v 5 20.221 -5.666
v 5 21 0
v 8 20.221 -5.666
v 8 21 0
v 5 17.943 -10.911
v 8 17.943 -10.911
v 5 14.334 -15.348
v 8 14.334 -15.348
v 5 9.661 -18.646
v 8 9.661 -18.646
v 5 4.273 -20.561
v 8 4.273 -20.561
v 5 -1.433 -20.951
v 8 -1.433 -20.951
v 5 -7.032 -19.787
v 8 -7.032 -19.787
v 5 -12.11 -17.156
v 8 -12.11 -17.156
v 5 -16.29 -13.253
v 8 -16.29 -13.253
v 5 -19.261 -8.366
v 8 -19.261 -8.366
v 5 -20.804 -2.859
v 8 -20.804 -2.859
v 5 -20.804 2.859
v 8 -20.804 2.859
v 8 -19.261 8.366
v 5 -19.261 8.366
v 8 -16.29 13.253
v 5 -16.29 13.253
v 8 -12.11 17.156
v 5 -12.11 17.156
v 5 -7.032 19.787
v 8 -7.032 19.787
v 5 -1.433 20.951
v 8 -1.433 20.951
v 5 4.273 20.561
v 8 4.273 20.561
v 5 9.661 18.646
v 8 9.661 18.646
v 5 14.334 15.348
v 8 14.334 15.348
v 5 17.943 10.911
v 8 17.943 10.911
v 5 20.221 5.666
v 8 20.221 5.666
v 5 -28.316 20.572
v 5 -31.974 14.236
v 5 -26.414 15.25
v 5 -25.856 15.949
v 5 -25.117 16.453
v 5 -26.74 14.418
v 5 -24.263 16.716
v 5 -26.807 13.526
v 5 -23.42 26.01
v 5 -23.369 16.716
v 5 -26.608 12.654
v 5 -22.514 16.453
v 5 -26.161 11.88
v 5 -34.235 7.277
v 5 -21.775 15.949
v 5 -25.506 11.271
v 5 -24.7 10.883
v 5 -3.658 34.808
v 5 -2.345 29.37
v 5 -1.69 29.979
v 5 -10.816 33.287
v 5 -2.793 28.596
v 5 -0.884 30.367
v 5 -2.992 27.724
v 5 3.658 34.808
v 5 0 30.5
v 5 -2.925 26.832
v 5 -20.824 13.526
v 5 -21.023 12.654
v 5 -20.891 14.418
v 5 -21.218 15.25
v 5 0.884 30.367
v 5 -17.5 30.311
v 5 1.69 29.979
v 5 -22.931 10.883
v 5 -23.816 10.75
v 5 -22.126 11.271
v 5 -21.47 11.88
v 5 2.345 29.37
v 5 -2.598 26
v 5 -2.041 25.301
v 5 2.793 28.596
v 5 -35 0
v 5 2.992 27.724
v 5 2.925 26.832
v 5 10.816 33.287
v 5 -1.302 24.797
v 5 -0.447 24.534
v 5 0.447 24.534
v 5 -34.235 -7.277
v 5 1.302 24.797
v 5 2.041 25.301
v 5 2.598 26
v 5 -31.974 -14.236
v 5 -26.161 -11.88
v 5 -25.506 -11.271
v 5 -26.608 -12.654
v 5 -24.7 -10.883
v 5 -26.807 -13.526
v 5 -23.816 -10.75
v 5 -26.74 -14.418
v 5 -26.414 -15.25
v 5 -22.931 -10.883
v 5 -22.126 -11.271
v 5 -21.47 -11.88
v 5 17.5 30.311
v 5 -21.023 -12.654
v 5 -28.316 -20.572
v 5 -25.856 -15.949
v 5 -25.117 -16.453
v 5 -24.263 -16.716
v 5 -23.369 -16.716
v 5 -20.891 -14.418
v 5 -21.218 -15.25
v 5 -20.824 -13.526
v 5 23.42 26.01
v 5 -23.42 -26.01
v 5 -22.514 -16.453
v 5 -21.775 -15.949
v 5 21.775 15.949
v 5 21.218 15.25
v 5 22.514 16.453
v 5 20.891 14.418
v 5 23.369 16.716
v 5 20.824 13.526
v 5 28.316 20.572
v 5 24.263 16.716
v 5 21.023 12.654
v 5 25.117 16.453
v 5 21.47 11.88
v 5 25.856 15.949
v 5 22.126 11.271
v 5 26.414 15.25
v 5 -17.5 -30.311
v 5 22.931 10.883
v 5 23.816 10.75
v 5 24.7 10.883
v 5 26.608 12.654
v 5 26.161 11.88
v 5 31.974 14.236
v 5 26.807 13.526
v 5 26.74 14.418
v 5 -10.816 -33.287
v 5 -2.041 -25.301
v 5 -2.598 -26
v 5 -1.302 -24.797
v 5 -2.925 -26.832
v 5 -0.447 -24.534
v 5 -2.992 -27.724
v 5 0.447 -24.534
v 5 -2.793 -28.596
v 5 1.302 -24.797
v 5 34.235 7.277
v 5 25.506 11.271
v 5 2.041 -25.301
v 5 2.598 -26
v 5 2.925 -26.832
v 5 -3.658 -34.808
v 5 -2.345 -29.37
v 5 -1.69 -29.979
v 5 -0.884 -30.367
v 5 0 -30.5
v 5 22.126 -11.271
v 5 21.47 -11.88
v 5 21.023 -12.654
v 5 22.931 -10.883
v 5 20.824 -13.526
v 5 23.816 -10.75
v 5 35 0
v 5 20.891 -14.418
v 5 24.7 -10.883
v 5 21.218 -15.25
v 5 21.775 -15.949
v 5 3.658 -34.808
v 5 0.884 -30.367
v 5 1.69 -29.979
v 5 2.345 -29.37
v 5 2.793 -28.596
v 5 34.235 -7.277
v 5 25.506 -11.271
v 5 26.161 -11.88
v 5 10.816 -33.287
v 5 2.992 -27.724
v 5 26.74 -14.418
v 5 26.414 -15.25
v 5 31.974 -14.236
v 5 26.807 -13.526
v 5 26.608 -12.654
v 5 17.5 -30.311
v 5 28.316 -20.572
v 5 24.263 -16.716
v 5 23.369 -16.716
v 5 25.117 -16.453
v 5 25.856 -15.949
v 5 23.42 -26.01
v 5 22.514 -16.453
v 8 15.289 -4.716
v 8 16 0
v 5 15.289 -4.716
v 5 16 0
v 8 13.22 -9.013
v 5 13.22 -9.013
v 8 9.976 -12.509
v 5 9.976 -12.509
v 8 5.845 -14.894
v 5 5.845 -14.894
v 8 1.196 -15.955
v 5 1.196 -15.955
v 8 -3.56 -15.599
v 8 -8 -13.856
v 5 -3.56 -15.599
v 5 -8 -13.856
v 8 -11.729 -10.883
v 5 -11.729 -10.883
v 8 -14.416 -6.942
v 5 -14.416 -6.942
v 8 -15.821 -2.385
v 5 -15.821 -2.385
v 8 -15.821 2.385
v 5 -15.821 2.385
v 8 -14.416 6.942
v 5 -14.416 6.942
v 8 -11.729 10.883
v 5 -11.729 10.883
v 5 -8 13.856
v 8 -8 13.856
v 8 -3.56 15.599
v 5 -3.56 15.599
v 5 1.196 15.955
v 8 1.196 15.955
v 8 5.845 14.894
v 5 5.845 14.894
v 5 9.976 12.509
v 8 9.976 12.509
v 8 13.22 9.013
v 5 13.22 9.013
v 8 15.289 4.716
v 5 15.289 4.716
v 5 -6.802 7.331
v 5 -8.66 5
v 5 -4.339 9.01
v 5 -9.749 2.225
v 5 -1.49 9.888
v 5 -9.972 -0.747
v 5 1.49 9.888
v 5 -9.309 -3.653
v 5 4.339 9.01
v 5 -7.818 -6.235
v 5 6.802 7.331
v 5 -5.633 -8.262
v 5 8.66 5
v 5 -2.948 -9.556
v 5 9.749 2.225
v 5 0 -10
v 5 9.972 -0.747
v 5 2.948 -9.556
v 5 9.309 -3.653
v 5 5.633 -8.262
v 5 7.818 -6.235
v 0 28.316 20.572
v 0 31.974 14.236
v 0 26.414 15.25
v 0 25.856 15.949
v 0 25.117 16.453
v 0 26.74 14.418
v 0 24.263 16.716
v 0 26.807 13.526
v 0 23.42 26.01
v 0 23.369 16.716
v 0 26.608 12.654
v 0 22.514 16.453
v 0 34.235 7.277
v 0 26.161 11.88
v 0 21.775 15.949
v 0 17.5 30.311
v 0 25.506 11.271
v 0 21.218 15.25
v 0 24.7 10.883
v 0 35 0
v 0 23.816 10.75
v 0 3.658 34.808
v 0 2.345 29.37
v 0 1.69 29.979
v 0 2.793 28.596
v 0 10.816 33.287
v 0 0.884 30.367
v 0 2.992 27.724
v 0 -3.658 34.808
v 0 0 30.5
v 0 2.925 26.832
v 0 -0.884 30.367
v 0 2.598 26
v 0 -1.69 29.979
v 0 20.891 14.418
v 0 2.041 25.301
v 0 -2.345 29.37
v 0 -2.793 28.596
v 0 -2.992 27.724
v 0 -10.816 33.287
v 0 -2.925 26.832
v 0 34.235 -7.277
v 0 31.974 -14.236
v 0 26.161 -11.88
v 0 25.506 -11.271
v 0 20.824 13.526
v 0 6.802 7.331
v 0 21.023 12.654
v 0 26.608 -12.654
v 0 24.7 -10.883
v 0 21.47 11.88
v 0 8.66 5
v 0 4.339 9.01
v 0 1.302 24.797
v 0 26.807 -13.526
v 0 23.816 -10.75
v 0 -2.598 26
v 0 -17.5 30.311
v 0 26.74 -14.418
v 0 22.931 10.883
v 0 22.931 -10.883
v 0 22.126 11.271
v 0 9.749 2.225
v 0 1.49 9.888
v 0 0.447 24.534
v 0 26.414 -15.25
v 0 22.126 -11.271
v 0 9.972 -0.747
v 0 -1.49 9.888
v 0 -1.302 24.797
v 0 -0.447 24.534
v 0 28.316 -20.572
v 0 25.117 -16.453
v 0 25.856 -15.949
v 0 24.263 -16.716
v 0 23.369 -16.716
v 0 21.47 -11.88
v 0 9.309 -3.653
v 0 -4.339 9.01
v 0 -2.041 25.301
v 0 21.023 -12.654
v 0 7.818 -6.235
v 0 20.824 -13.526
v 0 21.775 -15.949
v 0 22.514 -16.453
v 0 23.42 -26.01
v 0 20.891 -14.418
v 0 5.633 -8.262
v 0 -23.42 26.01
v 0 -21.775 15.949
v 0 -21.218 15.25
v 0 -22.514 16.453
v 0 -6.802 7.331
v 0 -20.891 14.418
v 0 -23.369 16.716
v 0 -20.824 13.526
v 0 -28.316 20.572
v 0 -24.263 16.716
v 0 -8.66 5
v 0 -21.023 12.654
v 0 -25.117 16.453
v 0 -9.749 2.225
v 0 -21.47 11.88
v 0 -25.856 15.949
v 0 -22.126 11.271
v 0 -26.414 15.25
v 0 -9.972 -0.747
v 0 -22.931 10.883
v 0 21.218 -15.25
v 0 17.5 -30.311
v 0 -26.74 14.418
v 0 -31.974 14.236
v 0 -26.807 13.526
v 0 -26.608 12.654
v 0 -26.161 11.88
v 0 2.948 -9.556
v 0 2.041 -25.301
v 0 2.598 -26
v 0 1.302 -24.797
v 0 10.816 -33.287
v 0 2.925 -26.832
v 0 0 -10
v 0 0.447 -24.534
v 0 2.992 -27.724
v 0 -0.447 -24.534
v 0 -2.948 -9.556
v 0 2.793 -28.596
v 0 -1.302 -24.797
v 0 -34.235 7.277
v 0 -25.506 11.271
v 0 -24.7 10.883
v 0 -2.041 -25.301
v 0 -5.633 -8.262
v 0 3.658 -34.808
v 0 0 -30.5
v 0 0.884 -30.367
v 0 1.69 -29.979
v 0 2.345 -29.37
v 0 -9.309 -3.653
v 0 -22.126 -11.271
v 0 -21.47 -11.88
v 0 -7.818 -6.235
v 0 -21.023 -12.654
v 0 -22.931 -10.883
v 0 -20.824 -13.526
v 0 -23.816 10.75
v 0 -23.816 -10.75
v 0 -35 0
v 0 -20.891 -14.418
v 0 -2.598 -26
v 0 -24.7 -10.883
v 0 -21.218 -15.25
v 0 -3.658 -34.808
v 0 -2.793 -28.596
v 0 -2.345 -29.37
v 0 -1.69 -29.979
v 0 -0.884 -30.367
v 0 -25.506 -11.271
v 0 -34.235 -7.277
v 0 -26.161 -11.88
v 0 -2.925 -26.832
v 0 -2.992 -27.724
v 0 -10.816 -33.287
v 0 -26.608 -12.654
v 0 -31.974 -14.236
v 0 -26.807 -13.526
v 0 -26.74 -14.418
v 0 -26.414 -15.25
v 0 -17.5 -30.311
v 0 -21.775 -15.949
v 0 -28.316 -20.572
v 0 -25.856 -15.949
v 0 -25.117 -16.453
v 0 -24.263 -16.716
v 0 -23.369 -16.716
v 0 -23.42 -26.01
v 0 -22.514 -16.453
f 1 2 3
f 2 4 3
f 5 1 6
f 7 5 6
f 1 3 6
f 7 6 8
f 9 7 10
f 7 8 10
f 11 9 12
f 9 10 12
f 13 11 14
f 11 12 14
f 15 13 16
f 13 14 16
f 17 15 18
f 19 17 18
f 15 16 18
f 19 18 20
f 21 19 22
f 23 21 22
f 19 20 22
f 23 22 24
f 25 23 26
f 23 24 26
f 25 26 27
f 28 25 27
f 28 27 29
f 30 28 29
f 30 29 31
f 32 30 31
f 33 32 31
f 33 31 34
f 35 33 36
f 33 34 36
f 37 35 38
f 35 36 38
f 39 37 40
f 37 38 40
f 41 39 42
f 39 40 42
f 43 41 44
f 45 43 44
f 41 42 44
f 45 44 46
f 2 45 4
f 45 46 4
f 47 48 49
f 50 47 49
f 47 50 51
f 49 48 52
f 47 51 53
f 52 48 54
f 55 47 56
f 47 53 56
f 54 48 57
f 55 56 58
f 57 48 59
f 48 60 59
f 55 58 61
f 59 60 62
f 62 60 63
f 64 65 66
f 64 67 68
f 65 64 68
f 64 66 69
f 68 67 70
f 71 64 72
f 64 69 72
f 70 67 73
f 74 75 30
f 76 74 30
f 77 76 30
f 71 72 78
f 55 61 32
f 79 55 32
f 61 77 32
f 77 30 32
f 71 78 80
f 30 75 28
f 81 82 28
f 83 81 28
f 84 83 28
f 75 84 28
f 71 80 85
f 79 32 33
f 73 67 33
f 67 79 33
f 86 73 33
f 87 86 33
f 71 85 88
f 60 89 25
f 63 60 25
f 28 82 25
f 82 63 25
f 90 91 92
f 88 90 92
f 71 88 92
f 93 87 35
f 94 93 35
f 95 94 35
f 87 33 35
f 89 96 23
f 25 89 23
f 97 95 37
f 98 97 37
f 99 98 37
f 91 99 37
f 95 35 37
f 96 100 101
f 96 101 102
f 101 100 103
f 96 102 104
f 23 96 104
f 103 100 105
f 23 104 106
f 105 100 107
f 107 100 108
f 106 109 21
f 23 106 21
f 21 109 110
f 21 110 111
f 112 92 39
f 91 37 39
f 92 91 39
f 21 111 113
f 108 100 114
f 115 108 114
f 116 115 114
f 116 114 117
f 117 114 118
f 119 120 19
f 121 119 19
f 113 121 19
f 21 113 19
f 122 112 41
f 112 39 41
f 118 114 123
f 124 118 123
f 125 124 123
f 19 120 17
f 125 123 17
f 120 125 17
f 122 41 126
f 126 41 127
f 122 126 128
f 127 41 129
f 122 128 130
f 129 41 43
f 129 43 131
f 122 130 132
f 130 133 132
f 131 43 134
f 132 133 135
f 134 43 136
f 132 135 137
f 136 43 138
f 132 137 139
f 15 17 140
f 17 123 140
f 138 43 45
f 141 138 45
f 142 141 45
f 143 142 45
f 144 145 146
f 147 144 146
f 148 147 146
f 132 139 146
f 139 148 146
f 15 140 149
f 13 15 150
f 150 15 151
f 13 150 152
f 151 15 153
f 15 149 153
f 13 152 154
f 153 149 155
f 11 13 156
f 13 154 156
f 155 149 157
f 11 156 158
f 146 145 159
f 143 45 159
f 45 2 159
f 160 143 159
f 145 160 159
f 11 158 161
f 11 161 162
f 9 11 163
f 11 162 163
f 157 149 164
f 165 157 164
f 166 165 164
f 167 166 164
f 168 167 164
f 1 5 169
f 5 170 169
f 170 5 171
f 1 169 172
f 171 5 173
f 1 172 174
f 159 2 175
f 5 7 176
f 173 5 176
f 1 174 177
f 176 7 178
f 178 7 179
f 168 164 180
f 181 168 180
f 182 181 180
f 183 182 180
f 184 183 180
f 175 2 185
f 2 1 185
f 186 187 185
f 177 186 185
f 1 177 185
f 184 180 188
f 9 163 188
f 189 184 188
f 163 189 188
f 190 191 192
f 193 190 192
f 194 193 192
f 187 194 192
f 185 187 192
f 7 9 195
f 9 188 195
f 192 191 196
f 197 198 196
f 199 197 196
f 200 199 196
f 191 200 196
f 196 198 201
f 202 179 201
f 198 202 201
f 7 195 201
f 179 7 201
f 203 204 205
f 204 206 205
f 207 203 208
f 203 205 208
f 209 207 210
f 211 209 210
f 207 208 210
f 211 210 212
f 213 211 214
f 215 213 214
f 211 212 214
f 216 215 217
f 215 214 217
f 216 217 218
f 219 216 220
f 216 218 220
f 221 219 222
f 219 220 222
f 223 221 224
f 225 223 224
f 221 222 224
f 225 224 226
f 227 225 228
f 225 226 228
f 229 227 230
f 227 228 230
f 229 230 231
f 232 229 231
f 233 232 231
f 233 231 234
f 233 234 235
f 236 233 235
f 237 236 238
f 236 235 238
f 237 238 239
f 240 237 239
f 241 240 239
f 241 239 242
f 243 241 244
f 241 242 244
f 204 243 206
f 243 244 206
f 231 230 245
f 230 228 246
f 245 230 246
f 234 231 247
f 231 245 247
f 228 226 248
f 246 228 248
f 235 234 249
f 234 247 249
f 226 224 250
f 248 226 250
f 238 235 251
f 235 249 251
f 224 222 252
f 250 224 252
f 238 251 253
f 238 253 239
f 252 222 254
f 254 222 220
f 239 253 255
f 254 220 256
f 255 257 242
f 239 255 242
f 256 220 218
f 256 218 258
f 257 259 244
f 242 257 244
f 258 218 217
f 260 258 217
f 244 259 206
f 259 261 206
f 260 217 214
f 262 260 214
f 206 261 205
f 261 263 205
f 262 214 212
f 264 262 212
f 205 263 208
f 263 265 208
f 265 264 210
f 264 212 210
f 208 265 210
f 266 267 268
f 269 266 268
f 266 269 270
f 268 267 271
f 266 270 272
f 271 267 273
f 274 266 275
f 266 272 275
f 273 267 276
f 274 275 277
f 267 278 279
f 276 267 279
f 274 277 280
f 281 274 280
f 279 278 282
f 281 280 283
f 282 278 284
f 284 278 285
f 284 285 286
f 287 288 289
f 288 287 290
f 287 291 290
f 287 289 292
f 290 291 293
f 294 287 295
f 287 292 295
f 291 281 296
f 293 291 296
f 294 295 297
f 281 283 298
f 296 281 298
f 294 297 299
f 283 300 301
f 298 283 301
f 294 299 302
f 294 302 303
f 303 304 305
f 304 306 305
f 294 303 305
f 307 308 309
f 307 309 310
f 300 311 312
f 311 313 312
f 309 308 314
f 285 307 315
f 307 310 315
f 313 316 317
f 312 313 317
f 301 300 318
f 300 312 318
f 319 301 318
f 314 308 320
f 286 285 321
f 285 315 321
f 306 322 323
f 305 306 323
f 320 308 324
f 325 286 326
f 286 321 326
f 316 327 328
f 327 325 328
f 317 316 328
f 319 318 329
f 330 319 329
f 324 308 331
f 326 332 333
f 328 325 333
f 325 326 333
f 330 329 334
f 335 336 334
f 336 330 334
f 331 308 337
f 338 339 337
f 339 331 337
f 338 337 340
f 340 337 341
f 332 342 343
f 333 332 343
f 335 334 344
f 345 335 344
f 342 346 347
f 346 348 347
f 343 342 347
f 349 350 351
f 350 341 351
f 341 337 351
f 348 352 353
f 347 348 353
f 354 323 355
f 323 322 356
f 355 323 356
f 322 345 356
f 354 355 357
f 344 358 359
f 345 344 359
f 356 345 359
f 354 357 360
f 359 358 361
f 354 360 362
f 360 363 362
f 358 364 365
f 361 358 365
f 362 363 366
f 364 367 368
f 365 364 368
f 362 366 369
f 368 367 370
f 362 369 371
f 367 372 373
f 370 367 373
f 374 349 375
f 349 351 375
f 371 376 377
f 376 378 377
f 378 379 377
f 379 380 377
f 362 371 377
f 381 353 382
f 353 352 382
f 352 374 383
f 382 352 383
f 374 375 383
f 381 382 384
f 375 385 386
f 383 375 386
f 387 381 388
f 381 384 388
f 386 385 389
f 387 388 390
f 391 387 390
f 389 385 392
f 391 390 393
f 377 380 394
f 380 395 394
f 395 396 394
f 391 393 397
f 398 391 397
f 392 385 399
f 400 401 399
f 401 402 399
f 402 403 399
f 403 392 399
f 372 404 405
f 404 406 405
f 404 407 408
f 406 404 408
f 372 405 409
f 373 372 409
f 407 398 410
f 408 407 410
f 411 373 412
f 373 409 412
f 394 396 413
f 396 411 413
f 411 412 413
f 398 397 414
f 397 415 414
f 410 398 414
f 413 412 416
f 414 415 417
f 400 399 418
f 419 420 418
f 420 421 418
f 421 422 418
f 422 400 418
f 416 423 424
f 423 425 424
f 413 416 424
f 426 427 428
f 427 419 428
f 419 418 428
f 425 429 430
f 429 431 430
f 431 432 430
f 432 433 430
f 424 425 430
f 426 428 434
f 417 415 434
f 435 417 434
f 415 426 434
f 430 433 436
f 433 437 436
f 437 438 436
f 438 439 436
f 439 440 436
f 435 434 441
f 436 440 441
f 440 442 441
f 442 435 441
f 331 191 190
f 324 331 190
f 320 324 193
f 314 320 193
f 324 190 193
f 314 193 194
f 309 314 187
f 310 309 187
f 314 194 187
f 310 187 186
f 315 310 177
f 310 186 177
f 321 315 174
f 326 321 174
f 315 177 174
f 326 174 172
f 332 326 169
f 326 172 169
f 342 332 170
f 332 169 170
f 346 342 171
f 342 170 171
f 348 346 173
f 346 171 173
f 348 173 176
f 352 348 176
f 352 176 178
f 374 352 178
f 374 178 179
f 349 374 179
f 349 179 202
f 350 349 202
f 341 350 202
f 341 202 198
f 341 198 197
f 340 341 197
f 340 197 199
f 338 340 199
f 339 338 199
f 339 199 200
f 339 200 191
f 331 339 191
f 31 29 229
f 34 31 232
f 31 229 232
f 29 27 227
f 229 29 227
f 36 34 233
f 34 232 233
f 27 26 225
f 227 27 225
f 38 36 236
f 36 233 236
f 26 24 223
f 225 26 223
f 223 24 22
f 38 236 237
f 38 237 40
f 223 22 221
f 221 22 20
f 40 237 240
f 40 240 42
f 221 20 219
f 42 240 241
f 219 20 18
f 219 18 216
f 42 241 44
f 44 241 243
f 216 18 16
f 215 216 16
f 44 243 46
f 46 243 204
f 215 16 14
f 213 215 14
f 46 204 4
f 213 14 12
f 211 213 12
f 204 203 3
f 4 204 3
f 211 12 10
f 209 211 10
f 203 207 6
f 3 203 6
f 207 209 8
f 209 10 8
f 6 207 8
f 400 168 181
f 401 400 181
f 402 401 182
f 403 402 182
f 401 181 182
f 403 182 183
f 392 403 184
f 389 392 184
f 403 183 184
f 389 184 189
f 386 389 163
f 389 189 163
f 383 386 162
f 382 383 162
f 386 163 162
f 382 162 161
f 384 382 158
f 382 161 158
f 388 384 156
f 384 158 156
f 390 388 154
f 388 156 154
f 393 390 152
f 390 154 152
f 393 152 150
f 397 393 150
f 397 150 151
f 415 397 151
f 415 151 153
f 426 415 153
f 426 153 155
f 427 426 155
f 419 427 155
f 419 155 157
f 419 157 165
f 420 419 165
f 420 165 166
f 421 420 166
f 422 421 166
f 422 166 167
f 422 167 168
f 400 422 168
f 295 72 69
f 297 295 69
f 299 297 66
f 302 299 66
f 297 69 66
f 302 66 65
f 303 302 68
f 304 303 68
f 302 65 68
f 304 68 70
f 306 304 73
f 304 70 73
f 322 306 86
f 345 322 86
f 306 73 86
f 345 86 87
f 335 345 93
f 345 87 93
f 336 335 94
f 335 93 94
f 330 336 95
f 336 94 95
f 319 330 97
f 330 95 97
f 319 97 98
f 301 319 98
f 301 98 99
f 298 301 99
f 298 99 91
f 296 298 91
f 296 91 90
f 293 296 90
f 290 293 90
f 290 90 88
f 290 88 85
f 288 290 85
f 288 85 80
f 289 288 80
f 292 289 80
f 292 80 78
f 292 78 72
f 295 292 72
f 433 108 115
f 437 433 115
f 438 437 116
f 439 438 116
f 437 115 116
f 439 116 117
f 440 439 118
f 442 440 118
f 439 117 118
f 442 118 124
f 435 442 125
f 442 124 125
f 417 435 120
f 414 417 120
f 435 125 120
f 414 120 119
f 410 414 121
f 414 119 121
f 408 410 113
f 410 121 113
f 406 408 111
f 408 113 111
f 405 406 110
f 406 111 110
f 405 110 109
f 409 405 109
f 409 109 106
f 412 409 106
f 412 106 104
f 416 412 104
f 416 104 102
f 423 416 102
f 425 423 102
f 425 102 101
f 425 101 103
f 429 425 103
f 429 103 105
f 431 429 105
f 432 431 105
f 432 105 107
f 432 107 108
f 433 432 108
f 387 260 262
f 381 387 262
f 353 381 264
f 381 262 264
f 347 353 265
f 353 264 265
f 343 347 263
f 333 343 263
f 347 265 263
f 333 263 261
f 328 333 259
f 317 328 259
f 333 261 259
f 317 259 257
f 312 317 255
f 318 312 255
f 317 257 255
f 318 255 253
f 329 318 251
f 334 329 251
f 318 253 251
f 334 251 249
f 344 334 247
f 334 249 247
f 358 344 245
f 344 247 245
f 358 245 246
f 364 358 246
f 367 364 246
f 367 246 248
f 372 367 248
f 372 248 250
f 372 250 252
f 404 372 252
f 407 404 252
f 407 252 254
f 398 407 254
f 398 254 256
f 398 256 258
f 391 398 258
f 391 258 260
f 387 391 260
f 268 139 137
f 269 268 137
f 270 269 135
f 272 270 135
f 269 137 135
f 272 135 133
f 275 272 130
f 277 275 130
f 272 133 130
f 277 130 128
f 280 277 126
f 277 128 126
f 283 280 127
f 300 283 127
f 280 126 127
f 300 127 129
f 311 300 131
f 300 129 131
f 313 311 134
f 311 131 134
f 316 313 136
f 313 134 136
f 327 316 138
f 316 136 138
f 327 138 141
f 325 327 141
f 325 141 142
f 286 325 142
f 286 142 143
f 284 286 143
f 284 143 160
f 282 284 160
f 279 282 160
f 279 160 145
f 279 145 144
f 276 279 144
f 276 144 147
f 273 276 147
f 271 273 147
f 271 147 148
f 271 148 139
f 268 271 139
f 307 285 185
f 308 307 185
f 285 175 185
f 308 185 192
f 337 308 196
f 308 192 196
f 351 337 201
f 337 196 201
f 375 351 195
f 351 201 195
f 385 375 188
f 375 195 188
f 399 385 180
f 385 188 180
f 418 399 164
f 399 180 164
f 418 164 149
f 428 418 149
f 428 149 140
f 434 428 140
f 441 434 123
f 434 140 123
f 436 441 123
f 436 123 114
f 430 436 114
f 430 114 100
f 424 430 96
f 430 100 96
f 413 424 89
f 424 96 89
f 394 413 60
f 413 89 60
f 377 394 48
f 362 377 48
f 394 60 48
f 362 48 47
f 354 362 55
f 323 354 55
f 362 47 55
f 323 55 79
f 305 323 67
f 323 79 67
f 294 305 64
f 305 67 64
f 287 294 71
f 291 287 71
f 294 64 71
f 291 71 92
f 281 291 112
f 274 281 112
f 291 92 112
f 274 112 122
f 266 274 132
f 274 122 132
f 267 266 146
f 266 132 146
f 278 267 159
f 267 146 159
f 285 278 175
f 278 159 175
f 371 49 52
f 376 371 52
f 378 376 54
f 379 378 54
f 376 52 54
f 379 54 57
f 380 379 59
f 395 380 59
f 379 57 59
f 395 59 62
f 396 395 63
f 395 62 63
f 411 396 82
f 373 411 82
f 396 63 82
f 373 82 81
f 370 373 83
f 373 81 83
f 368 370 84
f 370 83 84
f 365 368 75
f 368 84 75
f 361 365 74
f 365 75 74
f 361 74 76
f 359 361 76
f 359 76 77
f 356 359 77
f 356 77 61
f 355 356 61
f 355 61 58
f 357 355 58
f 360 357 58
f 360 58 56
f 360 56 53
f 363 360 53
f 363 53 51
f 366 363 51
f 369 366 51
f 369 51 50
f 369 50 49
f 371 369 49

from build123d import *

# Parameters (mm, degrees)
SKETCH2_R          = 3
CUT_EXTRUDE1_DEPTH = 10
CIRPATTERN1_COUNT  = 6
SKETCH3_R          = 10
CUT_EXTRUDE2_DEPTH = 10


with BuildPart() as part:
    # Sketch1 → Revolve1 (revolve)
    with BuildSketch(Plane.XY):
        Polygon((0, 35), (5, 35), (5, 21), (8, 21), (8, 16), (5, 16), (5, 0), (0, 0), align=None)
    revolve(axis=Axis((5, 0, 0), (-1, 0, 0)))

    # Sketch2 → Cut-Extrude1 (cut)
    with BuildSketch(Plane(origin=(5, 0, 0), x_dir=(0, 0, -1), z_dir=(1, 0, 0))):
        with Locations((27.5, 0)):
            Circle(SKETCH2_R)
    cut_extrude1 = extrude(amount=-CUT_EXTRUDE1_DEPTH, mode=Mode.SUBTRACT)

    # CirPattern1: Cut-Extrude1 ×6 about axis
    cirpattern1_axis = Axis((0, 0, 0), (1, 0, 0))
    for i in range(1, CIRPATTERN1_COUNT):
        add(cut_extrude1.rotate(cirpattern1_axis, i * 360 / CIRPATTERN1_COUNT), mode=Mode.SUBTRACT)

    # Sketch3 → Cut-Extrude2 (cut)
    with BuildSketch(Plane(origin=(5, 0, 0), x_dir=(0, 0, -1), z_dir=(1, 0, 0))):
        Circle(SKETCH3_R)
    extrude(amount=-CUT_EXTRUDE2_DEPTH, mode=Mode.SUBTRACT)


solid = part.part
